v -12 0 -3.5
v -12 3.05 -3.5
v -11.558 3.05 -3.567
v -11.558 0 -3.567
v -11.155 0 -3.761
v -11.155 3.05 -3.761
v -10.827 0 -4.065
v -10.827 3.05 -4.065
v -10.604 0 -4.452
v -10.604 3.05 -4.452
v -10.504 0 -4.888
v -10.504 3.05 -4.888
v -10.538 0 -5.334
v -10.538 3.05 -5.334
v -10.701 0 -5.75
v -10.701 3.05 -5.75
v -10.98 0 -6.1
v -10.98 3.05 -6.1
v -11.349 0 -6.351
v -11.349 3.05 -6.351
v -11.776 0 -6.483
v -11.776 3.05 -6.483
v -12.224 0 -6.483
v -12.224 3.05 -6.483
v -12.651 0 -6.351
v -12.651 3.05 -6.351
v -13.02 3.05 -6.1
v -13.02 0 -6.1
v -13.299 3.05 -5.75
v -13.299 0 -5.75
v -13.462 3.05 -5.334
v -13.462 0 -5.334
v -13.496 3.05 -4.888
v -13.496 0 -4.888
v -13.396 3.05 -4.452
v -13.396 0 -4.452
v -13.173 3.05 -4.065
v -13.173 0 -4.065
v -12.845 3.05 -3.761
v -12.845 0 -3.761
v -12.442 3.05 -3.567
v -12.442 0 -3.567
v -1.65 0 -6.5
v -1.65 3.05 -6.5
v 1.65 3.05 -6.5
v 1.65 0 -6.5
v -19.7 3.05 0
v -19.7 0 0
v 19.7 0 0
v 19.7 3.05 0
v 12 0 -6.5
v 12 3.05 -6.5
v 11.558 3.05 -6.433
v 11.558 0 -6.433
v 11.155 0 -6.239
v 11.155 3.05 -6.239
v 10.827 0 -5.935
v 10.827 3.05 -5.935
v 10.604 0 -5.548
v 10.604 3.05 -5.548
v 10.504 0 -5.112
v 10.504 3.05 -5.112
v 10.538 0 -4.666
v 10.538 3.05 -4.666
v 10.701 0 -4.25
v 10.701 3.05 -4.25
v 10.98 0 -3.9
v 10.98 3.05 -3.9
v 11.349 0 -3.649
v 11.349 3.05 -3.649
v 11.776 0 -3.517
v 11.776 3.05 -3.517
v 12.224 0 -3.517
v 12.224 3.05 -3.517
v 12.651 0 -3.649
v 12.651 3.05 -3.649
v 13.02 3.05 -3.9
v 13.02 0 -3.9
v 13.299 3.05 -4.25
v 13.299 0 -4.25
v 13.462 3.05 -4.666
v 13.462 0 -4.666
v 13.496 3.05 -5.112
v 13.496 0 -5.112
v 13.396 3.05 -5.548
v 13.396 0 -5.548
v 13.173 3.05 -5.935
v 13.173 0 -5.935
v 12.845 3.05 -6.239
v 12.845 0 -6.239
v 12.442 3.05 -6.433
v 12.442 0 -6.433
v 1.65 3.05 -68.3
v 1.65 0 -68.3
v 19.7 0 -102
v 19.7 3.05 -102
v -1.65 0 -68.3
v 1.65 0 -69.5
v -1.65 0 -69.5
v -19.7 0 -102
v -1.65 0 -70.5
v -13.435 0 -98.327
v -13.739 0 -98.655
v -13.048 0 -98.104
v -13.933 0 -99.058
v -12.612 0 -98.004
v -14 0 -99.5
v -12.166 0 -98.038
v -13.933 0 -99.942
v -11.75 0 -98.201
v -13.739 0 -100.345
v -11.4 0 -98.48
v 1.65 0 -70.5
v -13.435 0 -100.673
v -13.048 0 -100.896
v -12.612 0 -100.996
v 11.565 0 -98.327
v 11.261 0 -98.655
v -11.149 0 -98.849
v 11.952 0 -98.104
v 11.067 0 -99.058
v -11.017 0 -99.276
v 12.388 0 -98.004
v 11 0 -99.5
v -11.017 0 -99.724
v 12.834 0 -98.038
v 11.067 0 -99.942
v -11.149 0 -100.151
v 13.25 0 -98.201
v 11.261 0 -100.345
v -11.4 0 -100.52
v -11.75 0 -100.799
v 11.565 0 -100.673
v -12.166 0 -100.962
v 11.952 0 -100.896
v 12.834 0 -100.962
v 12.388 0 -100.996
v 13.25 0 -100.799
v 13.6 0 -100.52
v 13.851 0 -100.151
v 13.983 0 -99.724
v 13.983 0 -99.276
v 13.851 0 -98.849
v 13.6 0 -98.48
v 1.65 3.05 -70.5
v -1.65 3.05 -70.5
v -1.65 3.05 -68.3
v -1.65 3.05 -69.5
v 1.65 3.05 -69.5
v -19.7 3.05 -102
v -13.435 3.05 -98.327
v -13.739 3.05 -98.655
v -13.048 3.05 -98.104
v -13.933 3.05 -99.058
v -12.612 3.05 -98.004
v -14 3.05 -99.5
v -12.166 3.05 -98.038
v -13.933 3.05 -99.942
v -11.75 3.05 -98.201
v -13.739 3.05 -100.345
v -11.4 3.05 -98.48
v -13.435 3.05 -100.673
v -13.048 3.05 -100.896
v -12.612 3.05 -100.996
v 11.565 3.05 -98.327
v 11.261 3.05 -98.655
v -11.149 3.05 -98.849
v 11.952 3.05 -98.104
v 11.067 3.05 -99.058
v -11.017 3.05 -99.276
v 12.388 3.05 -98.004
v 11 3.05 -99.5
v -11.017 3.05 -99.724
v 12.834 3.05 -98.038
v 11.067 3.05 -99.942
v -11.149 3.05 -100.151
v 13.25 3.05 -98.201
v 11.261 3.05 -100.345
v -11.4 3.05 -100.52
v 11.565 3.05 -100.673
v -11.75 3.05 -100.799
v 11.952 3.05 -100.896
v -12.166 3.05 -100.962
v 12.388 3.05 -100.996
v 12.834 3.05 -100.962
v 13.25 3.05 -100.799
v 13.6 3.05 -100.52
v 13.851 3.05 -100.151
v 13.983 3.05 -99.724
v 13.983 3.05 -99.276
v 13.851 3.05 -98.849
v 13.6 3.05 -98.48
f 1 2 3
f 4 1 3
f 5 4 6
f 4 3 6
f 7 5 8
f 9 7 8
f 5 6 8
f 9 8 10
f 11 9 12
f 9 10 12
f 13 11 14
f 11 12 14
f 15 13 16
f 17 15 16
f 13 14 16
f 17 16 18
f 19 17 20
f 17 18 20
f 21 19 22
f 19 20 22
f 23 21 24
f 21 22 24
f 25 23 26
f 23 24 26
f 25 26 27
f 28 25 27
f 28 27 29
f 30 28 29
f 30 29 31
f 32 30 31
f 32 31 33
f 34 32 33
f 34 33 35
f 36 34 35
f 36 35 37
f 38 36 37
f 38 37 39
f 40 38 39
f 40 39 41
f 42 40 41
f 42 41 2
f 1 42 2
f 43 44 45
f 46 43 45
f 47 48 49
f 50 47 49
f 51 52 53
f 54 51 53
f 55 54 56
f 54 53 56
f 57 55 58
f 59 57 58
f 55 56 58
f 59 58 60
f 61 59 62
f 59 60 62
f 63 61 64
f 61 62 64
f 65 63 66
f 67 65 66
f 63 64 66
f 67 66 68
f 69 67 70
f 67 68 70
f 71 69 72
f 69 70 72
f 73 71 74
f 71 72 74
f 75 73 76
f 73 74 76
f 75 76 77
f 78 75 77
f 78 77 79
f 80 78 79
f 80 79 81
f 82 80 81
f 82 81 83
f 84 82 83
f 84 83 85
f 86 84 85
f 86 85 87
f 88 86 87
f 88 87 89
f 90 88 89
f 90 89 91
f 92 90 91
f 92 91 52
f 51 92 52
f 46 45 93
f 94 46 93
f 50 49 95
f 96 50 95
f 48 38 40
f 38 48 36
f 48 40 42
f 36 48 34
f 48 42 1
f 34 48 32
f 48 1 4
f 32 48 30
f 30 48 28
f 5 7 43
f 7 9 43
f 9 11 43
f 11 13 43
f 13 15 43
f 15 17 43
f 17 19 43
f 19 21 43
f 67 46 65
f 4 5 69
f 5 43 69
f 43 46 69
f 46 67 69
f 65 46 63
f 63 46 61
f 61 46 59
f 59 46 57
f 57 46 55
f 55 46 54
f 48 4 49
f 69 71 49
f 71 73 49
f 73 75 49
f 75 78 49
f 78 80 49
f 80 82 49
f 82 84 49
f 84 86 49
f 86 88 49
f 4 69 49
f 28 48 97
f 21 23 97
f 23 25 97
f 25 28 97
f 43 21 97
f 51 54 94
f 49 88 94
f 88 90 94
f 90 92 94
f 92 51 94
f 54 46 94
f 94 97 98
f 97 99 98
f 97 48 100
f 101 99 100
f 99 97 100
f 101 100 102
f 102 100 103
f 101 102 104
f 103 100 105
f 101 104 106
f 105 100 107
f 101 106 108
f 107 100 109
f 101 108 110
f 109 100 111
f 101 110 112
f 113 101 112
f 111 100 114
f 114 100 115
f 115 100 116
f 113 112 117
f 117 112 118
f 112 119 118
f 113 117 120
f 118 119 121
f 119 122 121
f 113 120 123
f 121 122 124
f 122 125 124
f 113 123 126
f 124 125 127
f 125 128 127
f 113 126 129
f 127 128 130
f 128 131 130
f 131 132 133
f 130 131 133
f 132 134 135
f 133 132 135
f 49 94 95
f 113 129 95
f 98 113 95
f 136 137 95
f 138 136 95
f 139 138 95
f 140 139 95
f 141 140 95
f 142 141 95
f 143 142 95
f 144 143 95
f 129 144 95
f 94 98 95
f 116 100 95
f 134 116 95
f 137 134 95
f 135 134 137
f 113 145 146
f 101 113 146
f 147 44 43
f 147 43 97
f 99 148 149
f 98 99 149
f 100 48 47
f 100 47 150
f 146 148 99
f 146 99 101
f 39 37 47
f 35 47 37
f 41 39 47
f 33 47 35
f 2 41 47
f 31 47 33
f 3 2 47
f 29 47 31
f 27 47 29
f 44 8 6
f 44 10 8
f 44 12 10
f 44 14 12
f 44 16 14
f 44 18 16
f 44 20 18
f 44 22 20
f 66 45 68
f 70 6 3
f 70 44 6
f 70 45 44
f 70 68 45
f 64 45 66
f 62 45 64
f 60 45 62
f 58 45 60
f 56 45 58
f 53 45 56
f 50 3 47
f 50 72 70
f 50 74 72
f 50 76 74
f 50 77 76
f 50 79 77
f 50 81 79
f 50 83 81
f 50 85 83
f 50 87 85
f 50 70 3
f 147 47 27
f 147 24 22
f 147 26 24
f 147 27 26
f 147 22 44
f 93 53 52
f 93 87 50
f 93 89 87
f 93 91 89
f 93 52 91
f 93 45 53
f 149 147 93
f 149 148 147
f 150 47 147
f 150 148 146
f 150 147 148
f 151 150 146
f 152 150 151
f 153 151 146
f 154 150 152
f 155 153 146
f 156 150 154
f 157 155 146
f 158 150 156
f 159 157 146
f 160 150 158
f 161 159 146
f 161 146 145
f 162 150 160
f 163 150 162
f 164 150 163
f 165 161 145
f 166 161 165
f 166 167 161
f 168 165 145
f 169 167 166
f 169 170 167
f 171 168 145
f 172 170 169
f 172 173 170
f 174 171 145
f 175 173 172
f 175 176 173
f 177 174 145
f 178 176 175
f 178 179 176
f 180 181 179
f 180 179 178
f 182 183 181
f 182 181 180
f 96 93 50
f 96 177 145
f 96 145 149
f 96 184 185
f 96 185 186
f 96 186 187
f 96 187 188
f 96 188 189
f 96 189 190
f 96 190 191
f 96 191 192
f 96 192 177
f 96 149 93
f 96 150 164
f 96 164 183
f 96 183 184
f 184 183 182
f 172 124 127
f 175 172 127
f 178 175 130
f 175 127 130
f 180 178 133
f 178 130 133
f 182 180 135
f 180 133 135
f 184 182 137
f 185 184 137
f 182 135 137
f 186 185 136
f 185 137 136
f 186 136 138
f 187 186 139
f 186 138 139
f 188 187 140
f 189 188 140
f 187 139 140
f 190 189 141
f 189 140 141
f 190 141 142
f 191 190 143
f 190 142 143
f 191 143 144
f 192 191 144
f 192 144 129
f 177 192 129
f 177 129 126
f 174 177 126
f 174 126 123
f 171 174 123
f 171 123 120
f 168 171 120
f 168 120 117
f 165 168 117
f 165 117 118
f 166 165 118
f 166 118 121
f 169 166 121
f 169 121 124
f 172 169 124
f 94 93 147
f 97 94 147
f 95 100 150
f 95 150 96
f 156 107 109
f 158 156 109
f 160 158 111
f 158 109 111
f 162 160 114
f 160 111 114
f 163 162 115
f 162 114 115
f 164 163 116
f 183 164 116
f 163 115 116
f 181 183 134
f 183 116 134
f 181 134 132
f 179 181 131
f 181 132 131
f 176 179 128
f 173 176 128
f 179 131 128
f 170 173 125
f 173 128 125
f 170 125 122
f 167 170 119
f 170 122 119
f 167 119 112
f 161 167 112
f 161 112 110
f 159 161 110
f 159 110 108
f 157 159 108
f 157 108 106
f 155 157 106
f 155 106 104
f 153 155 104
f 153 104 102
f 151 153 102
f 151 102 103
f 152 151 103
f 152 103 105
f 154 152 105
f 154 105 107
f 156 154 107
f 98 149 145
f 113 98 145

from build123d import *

# Parameters (mm, degrees)
SKETCH1_W             = 39.4
SKETCH1_H             = 102
BOSS_EXTRUDE1_DEPTH   = 3.05
SKETCH4_W             = 1.65
SKETCH4_H             = 1
SKETCH4_H_2           = 61.8
CUT_EXTRUDE1_DEPTH    = 104.929747907
SKETCH7_R             = 1.5
CUT_EXTRUDE4_DEPTH    = 104.929747907
F_3_0MM_DOWEL_HOLE1_D = 3


with BuildPart() as part:
    # Sketch1 → Boss-Extrude1 (new body)
    with BuildSketch(Plane(origin=(0, 0, 0), x_dir=(1, 0, 0), z_dir=(0, 1, 0))):
        with Locations((0, 51)):
            Rectangle(SKETCH1_W, SKETCH1_H)
    extrude(amount=BOSS_EXTRUDE1_DEPTH)

    # Sketch4 → Cut-Extrude1 (cut, through all)
    with BuildSketch(Plane(origin=(0, 3.05, 0), x_dir=(1, 0, 0), z_dir=(0, 1, 0))):
        with Locations((-0.825, 70)):
            Rectangle(SKETCH4_W, SKETCH4_H)
        with Locations((-0.825, 37.4)):
            Rectangle(SKETCH4_W, SKETCH4_H_2)
        with Locations((0.825, 37.4)):
            Rectangle(SKETCH4_W, SKETCH4_H_2)
        with Locations((0.825, 70)):
            Rectangle(SKETCH4_W, SKETCH4_H)
    extrude(amount=-CUT_EXTRUDE1_DEPTH, mode=Mode.SUBTRACT)

    # Sketch7 → Cut-Extrude4 (cut, through all)
    with BuildSketch(Plane(origin=(0, 3.05, 0), x_dir=(1, 0, 0), z_dir=(0, 1, 0))):
        with Locations(Location((-12, 5, 0), (0, 0, 270))):
            Circle(SKETCH7_R)
        with Locations(Location((12, 5, 0), (0, 0, 90))):
            Circle(SKETCH7_R)
    extrude(amount=-CUT_EXTRUDE4_DEPTH, mode=Mode.SUBTRACT)

    # Ø3.0mm Dowel Hole1 (through all)
    with Locations(Plane(origin=(0, 3.05, 0), x_dir=(1, 0, 0), z_dir=(0, 1, 0))):
        with Locations((-12.5, 99.5), (12.5, 99.5)):
            Hole(F_3_0MM_DOWEL_HOLE1_D / 2)


solid = part.part
